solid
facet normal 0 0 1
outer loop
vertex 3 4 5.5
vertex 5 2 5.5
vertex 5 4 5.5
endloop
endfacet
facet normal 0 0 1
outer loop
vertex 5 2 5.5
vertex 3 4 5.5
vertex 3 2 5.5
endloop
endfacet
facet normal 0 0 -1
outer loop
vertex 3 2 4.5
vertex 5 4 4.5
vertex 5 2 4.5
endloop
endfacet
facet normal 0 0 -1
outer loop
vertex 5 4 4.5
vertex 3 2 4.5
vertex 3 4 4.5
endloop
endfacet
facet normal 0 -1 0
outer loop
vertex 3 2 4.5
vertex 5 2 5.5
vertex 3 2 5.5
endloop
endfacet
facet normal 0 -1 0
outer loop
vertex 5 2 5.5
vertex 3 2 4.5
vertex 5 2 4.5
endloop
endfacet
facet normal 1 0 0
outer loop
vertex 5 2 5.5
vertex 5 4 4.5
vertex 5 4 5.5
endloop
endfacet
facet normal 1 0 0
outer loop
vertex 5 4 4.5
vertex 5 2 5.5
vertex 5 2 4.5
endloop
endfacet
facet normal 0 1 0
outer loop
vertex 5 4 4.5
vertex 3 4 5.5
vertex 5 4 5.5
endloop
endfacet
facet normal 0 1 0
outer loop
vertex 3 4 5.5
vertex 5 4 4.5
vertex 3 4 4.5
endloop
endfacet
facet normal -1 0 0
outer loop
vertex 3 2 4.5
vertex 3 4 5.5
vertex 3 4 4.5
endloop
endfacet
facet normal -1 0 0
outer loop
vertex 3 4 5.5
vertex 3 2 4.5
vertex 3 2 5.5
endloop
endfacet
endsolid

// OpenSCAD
difference() {
linear_extrude(10)	import("../dxf/test_2x8mm.dxf", $fn=100);
translate([0,-0.3,0])cube(2.8);
translate([0,-0.3,5])cube(2.8);

translate([5.4,-0.3,2.4])cube(2.6);
translate([5.4,-0.3,7.4])cube(2.6);
}

translate([3,2,4.5])
	scale([1,1,0.5])
		cube(2);
